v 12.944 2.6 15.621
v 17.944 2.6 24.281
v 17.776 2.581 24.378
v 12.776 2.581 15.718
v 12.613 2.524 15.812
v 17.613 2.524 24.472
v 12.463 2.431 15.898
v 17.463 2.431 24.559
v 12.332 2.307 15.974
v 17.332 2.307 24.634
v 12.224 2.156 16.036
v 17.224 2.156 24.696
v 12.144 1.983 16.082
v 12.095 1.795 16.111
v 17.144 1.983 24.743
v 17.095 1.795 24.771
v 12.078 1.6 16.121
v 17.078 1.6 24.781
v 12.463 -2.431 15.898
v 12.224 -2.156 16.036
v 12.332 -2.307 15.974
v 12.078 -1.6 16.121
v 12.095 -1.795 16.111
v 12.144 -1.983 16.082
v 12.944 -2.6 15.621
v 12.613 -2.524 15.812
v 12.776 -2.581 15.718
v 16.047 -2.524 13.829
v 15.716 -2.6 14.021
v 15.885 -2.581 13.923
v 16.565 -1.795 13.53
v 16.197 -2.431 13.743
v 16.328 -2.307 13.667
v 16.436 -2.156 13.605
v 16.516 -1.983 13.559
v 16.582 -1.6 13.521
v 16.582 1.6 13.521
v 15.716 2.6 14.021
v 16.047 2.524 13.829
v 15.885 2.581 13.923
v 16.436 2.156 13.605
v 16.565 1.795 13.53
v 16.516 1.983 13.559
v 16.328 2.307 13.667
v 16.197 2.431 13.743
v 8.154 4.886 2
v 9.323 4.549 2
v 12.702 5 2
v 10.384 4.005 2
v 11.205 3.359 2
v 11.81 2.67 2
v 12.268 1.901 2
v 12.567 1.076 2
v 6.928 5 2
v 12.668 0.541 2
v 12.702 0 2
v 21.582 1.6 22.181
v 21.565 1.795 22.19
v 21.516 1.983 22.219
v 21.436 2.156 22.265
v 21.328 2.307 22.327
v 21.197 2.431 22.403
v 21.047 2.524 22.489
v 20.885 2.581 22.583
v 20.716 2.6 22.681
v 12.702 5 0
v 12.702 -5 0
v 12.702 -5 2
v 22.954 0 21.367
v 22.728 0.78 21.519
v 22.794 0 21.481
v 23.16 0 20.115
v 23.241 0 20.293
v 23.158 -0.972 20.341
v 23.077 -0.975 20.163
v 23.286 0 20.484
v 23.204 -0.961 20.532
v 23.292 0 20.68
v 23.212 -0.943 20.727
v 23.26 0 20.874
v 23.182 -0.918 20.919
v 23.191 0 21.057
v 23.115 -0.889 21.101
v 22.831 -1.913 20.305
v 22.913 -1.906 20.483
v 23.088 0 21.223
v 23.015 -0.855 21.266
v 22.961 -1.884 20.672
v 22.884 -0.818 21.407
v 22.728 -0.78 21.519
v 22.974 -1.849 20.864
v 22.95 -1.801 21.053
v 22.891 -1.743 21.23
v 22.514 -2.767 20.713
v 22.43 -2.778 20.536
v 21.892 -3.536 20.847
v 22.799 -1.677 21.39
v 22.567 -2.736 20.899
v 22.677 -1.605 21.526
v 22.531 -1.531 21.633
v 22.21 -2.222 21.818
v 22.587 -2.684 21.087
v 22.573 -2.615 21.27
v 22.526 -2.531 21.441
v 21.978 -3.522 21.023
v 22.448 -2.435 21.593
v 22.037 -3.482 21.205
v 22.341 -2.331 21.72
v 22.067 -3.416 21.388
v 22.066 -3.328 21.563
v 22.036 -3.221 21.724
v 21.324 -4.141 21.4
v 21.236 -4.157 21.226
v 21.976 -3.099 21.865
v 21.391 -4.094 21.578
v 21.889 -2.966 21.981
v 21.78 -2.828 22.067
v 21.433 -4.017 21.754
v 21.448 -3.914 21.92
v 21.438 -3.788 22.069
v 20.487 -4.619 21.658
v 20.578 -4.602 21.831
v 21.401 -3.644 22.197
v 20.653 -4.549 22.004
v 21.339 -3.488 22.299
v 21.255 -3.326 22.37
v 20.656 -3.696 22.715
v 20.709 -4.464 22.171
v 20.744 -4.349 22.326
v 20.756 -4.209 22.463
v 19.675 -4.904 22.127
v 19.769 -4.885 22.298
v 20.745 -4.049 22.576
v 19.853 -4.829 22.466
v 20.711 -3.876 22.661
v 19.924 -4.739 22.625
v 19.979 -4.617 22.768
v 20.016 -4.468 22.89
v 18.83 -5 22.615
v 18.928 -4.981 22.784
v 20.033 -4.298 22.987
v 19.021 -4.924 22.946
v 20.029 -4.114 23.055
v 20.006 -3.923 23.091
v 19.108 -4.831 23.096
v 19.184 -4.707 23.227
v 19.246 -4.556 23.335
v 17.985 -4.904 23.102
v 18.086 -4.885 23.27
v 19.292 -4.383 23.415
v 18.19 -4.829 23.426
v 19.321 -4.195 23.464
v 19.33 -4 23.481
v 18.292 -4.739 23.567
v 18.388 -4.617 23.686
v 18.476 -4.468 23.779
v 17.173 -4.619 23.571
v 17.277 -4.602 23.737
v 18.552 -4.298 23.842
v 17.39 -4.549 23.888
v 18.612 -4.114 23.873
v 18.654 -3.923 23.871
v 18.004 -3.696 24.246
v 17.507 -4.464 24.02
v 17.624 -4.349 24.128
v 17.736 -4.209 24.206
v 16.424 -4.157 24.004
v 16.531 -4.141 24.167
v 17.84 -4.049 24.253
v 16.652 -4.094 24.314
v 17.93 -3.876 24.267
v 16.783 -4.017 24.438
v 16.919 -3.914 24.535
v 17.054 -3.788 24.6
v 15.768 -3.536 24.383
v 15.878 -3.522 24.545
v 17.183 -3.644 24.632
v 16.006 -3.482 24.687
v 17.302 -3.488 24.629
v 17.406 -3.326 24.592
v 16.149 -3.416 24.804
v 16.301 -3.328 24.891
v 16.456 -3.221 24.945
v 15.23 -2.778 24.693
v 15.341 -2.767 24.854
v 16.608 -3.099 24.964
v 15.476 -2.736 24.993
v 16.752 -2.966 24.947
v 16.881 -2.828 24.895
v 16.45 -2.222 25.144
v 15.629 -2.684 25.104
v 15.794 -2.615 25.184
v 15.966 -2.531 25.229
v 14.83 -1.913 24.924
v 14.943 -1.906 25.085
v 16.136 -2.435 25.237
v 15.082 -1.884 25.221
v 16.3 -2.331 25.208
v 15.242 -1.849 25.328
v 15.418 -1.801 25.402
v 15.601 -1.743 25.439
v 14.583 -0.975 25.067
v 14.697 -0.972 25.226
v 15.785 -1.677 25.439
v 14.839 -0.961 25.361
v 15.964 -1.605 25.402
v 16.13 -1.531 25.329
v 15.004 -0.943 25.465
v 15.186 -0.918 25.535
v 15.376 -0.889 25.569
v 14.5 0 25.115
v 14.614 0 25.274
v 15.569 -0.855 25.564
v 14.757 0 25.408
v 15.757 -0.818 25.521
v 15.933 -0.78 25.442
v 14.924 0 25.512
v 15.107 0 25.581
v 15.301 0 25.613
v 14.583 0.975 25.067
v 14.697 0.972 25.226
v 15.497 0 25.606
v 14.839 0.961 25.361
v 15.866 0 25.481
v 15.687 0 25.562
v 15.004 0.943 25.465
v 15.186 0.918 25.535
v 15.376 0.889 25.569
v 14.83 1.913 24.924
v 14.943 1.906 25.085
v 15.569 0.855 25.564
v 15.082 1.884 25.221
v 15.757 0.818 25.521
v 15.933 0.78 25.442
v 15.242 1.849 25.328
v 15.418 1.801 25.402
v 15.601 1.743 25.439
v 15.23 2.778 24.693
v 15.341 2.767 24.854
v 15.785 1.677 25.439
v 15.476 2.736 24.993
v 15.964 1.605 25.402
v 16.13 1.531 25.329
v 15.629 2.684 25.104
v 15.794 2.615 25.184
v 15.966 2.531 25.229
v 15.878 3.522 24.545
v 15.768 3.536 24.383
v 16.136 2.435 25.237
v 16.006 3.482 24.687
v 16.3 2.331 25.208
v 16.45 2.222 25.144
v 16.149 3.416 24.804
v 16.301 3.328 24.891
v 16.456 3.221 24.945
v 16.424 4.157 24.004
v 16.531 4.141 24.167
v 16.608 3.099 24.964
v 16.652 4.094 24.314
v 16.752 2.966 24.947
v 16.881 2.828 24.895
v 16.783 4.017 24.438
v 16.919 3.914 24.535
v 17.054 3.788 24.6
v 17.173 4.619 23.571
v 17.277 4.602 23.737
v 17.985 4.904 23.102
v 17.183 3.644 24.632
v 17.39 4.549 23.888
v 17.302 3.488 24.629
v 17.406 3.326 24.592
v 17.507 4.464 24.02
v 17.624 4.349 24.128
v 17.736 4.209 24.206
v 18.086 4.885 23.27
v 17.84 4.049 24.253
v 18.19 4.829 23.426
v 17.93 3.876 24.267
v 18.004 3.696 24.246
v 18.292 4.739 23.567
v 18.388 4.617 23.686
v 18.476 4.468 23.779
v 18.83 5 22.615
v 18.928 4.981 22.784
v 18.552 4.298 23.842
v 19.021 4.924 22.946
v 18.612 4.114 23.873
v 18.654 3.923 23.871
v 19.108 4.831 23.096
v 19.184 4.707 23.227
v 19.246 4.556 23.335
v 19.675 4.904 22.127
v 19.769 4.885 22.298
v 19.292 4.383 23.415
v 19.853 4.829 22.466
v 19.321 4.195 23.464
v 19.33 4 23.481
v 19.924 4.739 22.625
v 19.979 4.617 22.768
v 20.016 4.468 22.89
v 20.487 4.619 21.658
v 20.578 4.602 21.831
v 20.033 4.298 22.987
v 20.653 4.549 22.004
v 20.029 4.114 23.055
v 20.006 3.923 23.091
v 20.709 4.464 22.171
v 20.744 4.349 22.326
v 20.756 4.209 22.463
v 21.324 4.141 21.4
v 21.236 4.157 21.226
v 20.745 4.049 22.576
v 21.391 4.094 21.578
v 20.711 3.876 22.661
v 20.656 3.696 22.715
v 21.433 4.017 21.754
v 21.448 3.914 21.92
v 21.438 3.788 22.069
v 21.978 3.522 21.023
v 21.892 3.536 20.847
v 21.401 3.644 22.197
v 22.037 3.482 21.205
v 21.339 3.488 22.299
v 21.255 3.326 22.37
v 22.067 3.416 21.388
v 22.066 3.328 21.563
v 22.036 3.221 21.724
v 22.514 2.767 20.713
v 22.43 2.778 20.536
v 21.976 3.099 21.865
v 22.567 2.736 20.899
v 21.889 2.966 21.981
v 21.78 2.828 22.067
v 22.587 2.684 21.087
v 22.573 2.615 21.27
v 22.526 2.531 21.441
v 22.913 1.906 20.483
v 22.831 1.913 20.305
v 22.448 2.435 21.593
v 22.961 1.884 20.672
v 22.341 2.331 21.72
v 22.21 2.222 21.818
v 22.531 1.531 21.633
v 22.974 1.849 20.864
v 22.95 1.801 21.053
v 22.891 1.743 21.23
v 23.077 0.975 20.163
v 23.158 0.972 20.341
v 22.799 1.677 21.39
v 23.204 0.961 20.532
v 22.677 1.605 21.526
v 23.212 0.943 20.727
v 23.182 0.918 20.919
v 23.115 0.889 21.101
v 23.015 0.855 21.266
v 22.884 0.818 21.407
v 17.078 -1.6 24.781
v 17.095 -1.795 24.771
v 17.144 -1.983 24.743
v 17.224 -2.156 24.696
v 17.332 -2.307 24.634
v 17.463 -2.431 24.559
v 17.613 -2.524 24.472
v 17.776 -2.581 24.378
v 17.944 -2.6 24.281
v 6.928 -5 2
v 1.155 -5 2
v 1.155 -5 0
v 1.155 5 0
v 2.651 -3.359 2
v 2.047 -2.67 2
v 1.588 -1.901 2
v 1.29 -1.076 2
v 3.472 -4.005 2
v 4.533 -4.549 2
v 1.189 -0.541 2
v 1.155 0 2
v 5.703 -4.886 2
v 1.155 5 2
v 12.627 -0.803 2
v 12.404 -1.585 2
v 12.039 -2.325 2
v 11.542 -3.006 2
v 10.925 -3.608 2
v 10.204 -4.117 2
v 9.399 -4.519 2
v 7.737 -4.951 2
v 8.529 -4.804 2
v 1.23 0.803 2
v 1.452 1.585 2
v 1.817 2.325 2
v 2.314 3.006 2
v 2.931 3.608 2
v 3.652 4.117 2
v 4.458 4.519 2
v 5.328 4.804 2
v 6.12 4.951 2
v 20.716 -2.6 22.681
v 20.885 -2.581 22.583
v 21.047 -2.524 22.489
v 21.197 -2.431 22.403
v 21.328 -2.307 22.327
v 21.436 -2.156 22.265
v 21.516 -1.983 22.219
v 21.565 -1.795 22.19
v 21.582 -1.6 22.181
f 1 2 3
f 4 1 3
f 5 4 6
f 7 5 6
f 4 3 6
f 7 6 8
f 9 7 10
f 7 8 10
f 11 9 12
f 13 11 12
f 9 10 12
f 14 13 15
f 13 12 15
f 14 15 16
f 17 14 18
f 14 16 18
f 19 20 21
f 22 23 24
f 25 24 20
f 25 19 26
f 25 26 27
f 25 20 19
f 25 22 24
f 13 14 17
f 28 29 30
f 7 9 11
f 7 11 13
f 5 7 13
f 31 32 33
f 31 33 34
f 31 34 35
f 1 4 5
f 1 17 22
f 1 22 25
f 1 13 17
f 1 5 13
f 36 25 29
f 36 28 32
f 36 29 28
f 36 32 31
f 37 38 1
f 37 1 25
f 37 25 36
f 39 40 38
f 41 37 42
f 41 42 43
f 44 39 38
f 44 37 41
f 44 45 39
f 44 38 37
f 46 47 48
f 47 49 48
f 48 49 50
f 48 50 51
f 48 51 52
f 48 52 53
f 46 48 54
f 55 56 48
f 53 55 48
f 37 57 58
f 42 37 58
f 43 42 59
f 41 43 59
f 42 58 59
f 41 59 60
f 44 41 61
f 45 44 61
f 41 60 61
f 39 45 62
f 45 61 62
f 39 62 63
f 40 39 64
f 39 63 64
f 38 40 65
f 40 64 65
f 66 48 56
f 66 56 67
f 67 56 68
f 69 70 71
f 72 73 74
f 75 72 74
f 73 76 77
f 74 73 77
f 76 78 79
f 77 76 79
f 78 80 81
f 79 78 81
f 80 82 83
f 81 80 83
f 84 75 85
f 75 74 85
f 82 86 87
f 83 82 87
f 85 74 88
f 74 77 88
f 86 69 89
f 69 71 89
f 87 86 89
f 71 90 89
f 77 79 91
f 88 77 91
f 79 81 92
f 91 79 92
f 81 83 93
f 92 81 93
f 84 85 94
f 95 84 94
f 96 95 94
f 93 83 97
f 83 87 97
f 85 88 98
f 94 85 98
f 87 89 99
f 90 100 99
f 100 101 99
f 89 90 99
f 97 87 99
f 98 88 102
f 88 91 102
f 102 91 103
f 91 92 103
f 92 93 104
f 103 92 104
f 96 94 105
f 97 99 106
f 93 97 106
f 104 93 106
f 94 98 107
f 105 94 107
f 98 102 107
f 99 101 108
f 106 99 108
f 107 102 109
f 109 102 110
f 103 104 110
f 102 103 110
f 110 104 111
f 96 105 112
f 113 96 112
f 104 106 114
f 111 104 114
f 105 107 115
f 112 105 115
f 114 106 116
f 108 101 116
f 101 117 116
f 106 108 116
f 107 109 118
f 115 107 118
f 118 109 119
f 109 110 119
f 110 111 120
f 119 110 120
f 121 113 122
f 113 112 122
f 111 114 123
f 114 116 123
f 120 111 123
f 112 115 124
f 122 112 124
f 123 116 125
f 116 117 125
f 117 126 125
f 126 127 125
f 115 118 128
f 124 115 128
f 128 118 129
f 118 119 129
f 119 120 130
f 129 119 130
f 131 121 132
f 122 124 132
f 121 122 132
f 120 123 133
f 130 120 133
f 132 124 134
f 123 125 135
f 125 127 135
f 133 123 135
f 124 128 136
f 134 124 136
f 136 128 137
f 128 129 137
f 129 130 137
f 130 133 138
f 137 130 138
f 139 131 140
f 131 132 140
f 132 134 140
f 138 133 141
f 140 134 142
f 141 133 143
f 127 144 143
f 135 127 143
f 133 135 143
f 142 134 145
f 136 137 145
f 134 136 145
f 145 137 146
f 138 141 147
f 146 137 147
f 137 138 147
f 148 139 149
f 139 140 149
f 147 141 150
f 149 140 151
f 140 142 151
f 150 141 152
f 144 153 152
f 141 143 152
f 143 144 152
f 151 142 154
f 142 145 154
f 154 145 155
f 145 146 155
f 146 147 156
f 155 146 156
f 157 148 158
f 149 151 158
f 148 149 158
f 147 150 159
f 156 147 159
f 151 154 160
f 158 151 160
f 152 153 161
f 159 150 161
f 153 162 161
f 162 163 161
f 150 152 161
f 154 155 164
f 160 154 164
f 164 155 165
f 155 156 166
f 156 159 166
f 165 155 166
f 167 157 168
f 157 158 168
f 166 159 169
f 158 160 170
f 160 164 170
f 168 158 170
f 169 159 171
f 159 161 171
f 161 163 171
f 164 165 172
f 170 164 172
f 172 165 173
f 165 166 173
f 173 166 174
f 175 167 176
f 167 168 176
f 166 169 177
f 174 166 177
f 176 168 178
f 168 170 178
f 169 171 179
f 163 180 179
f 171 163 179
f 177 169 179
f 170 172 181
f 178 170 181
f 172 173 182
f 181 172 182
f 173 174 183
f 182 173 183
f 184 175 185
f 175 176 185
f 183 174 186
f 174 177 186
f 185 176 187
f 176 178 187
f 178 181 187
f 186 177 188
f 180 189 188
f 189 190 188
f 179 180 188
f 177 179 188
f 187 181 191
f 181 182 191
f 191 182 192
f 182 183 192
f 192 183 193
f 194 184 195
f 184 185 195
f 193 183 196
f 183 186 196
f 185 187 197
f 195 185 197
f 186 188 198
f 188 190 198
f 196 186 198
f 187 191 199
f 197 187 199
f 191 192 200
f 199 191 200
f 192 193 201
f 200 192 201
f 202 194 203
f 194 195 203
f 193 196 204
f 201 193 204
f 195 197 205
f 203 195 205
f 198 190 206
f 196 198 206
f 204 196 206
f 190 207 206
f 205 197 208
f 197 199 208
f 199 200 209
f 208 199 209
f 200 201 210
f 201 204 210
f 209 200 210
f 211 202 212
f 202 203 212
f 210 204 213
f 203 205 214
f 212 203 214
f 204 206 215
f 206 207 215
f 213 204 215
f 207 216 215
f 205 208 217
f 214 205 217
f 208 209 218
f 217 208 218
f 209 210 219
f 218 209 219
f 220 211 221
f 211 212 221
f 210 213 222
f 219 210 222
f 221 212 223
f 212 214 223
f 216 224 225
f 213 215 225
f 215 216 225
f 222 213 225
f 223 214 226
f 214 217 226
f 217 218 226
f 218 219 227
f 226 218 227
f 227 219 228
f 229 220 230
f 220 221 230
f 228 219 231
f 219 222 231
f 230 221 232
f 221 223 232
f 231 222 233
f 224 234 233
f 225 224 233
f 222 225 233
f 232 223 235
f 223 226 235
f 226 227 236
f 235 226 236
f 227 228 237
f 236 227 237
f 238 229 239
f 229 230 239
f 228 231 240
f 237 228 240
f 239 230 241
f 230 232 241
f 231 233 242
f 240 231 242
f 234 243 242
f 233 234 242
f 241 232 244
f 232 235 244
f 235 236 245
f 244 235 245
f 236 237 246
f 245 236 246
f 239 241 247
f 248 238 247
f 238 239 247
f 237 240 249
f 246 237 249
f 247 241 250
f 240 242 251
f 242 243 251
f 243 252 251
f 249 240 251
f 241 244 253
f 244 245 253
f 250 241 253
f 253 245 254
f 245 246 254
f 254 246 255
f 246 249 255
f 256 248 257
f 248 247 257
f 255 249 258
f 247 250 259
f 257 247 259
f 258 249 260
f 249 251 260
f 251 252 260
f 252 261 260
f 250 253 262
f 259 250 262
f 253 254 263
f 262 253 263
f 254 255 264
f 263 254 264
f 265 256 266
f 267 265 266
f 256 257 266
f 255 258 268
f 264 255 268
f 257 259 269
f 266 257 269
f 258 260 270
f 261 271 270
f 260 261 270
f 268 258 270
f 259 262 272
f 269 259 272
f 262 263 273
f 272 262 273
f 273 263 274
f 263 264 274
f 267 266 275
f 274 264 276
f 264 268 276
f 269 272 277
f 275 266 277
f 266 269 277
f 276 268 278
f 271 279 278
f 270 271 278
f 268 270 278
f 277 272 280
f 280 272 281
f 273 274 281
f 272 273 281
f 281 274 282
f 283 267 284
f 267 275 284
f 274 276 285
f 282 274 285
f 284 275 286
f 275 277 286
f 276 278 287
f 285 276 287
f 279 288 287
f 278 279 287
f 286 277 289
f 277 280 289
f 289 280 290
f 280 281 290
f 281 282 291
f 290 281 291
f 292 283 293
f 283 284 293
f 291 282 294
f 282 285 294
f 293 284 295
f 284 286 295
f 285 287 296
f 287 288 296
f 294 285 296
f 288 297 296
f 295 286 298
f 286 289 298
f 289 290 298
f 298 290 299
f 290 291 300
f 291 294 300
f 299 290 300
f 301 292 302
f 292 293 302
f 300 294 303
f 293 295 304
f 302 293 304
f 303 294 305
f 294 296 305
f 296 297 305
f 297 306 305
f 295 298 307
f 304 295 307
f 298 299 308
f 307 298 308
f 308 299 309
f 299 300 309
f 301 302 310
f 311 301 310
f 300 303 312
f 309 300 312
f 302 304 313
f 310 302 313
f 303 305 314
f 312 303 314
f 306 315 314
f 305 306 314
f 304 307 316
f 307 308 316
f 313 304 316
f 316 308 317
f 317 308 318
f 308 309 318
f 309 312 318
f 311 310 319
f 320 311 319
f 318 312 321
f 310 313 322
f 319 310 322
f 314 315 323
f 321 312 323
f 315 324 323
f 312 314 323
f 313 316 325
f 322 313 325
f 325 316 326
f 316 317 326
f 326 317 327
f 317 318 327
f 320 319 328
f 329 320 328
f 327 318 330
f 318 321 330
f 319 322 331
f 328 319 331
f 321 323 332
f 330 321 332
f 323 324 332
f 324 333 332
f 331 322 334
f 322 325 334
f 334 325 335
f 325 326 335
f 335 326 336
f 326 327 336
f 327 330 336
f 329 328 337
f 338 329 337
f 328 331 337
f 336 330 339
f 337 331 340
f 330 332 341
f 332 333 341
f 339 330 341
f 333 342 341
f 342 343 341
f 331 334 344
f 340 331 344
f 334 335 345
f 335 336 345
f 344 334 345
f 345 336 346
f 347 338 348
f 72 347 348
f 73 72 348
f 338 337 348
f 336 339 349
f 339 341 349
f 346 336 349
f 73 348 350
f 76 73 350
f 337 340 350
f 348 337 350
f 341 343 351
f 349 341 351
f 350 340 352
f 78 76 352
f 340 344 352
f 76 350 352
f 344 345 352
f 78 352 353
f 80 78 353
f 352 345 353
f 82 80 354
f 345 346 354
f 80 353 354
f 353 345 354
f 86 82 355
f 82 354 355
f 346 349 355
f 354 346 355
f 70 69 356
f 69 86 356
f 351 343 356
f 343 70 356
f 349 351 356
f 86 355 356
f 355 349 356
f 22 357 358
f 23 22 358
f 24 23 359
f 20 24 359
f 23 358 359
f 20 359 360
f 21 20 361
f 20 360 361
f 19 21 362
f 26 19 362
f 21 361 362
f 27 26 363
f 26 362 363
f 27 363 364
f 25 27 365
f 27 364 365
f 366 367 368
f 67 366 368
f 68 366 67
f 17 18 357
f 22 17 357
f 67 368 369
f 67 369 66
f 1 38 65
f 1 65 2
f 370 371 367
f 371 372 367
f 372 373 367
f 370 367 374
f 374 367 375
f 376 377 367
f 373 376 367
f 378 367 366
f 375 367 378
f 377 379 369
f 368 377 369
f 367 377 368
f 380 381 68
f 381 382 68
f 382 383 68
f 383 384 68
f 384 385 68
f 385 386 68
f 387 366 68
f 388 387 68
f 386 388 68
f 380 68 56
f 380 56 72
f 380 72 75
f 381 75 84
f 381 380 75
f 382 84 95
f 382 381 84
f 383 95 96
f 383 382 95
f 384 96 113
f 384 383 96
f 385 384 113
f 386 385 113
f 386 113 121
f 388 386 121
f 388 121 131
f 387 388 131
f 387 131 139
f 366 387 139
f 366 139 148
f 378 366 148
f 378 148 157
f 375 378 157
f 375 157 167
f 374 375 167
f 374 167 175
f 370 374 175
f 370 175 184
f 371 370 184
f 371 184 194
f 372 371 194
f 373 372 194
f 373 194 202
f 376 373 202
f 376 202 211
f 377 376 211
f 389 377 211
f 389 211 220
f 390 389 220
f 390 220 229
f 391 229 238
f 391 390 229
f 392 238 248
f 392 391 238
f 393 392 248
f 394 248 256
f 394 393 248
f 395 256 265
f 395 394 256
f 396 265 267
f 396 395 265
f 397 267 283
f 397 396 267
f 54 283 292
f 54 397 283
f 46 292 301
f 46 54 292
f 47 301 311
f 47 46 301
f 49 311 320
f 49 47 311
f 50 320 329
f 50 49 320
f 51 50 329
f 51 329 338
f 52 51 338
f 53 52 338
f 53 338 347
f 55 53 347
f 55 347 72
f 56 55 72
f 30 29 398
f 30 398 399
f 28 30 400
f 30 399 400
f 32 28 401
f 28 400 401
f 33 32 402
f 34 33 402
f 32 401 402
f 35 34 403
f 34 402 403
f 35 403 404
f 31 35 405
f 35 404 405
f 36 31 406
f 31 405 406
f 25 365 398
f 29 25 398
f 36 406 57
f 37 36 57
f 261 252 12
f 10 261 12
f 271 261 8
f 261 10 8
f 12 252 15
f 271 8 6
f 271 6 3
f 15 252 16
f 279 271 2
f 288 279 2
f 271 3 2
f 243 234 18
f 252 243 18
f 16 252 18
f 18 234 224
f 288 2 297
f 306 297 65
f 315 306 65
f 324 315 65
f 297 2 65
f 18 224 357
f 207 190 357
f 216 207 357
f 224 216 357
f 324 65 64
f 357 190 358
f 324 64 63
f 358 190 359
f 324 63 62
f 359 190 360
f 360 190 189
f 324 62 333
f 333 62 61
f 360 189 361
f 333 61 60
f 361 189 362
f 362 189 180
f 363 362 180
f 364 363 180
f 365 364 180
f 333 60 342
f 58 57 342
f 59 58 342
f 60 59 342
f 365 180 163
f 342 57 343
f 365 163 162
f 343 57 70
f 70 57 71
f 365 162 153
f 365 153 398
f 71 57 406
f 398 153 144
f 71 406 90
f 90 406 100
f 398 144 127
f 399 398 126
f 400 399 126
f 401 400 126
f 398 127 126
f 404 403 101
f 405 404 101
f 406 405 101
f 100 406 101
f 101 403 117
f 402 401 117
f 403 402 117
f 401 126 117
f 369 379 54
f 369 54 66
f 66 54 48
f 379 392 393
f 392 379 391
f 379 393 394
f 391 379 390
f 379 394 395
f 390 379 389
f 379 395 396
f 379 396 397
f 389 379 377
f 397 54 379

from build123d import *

# Parameters (mm, degrees)
F2_R     = 5
F3_DEPTH = 30
F4_W     = 12.7017059222
F4_H     = 7
F5_DEPTH = 5.5
F6_W     = 11.5470053838
F6_H     = 10
F7_DEPTH = 2
F9_DEPTH = 10
F10_R    = 1


with BuildPart() as f3:
    # F2 (on face) → F3 (new body)
    with BuildSketch(Plane(origin=(0, 0, 0), x_dir=(0.8660254038, 0, -0.5), z_dir=(-0.5, 0, -0.8660254038))):
        with Locations((5, 0)):
            Circle(F2_R)
    extrude(amount=-F3_DEPTH)

    # F4 (on Front) → F5 (cut, symmetric)
    with BuildSketch(Plane.XZ):
        with Locations((6.3508529611, -1.5)):
            Rectangle(F4_W, F4_H)
    extrude(amount=F5_DEPTH, both=True, mode=Mode.SUBTRACT)

    # F6 (on face) → F7 (join)
    with BuildSketch(Plane(origin=(0, 0, 2), x_dir=(1, 0, 0), z_dir=(0, 0, -1))):
        with Locations((6.9282032303, 0)):
            Rectangle(F6_W, F6_H)
    extrude(amount=F7_DEPTH)

    # F8 (on face) → F9 (cut)
    with BuildSketch(Plane(origin=(15, 0, 25.9807621135), x_dir=(0.8660254038, 0, -0.5), z_dir=(0.5, 0, 0.8660254038))):
        with BuildLine():
            Line((6.6, 2.6), (3.4, 2.6))
            ThreePointArc((3.4, 2.6), (2.6928932188, 2.3071067812), (2.4, 1.6))
            Line((2.4, 1.6), (2.4, -1.6))
            ThreePointArc((2.4, -1.6), (2.6928932188, -2.3071067812), (3.4, -2.6))
            Line((3.4, -2.6), (6.6, -2.6))
            ThreePointArc((6.6, -2.6), (7.3071067812, -2.3071067812), (7.6, -1.6))
            Line((7.6, -1.6), (7.6, 1.6))
            ThreePointArc((7.6, 1.6), (7.3071067812, 2.3071067812), (6.6, 2.6))
        make_face()
    extrude(amount=-F9_DEPTH, mode=Mode.SUBTRACT)

    # F10
    f10_edges = [f3.edges().sort_by_distance(p)[0] for p in [
        (15, 0, 25.980762),
    ]]
    fillet(f10_edges, radius=F10_R)


solid = f3.part
